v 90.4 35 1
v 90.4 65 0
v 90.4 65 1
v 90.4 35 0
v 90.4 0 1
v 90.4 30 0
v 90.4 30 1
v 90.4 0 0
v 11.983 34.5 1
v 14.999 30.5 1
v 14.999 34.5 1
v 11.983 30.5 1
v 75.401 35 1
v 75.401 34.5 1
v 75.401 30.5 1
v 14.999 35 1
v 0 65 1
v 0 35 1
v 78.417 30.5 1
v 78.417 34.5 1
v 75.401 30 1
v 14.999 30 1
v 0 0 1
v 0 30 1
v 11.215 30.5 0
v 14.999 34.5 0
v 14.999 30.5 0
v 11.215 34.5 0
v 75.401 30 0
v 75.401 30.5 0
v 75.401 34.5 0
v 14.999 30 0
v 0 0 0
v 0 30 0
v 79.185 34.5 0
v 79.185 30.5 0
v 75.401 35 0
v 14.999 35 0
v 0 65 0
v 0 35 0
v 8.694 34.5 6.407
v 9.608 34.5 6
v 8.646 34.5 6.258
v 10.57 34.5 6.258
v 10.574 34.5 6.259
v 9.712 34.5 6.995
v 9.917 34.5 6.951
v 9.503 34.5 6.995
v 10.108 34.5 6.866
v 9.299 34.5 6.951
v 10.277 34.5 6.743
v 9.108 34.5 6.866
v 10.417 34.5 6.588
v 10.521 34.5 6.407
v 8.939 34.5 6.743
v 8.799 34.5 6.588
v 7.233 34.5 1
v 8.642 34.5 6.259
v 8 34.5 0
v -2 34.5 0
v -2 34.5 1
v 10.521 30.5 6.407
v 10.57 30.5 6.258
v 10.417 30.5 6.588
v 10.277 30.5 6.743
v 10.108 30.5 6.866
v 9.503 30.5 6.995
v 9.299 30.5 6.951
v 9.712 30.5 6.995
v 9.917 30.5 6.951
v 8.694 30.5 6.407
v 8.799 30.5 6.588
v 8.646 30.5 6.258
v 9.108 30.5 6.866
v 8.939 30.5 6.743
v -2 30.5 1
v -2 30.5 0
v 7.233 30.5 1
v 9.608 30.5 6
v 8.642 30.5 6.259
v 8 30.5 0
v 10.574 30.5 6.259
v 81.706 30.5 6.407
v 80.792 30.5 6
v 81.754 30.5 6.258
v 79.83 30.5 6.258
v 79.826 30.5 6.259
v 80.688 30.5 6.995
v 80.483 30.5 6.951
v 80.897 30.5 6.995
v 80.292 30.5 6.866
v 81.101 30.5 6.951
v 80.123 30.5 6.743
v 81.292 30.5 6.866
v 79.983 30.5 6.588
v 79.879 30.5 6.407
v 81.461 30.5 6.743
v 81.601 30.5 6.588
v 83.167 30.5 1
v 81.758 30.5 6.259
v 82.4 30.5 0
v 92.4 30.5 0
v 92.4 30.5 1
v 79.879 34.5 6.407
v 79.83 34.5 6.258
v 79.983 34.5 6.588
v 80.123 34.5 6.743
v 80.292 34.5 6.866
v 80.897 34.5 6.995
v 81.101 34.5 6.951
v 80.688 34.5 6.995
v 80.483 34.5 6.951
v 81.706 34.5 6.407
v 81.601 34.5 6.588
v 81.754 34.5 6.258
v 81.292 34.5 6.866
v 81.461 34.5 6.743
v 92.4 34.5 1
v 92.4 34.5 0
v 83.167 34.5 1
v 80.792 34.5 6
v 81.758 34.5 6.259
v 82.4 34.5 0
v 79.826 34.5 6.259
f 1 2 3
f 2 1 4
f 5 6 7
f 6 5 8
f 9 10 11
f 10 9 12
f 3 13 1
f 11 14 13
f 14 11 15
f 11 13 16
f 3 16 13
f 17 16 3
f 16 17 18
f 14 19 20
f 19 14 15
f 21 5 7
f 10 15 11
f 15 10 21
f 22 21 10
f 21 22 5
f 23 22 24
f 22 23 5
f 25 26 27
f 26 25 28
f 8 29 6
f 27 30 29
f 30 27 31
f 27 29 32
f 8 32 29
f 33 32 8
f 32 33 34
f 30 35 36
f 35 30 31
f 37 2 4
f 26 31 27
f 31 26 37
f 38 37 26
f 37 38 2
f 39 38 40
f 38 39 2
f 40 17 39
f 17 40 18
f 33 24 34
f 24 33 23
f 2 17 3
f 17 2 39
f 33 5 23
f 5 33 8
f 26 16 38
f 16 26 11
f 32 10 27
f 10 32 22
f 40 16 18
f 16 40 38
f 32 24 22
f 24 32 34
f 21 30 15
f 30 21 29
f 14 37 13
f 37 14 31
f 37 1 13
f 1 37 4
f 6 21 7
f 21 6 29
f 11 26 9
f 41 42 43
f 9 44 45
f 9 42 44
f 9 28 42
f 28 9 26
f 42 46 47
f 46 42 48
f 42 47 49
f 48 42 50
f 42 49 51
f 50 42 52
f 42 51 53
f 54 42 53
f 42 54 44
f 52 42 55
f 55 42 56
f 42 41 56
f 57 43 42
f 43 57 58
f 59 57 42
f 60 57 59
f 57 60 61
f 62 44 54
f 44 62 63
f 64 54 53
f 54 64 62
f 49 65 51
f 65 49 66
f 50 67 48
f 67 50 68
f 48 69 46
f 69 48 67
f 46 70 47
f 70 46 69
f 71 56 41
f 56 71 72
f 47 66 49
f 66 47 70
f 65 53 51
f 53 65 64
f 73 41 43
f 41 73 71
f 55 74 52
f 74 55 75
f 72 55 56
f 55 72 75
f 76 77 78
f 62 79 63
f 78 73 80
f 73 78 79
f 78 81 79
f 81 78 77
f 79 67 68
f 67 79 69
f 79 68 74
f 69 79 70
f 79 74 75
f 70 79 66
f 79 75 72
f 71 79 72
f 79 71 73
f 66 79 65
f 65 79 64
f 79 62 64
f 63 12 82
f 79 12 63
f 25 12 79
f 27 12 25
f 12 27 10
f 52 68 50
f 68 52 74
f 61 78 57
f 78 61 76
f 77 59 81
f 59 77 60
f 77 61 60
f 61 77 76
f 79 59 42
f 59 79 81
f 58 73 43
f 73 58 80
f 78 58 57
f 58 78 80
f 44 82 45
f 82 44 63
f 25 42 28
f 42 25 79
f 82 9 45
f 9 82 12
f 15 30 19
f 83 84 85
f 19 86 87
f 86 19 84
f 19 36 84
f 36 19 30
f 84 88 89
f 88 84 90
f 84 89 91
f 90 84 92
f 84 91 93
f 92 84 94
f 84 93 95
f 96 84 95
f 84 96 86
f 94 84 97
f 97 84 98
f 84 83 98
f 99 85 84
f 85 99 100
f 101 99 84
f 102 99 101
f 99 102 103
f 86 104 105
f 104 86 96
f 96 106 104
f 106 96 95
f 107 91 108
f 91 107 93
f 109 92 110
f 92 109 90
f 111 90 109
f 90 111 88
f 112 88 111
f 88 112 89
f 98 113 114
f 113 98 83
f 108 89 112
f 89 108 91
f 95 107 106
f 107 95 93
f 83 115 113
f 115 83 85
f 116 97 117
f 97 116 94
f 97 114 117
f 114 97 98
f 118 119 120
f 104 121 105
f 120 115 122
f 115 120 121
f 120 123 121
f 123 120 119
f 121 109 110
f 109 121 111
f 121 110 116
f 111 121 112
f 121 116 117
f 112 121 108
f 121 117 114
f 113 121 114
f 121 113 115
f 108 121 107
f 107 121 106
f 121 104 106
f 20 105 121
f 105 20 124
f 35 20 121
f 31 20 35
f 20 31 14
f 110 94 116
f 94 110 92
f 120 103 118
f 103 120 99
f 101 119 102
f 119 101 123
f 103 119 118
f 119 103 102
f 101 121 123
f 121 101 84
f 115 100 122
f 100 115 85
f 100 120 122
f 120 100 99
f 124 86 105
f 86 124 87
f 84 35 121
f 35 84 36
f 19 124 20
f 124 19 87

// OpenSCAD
// Mike's Experiment for Elevation 3D Print


// E.g. 4x6, 5x7, etc.
// 6x4 = [154, 103]
// 3.5x2.5 = [88.9, 63.5]
nominal_dimensions = [88.9, 63.5];

// Object to print
// "frame", "back"
object_type = "back";


// Output thickness (not including text) (mm)
thickness = 10;
// Depth of the frame in front of the photo. Large value here makes a shadow box.
front_depth = 2;

// Width of a single edge of the frame.
frame_width = 10;

// Where the front of the frame overlaps the photo
inner_photo_margin = 2;

// Tolerance around the outside of the photo on the back of the frame
outer_photo_margin = 1;

// The back plate that holds the photo.
back_thickness = 1;

// END Params.
// Everything below here is generation code.


// Photo positioning
outer_photo_dimensions = [nominal_dimensions.x + outer_photo_margin * 2, nominal_dimensions.y + outer_photo_margin * 2];
inner_photo_dimensions = [nominal_dimensions.x - inner_photo_margin * 2, nominal_dimensions.y - inner_photo_margin * 2];

photo_position = [frame_width, frame_width];



// Combine all the parts
if (object_type == "frame") {
  difference() {
    cube([inner_photo_dimensions.x + 2*frame_width, inner_photo_dimensions.y + 2*frame_width, thickness]);

    translate([photo_position.x, photo_position.y, -0.001]) cube([inner_photo_dimensions.x, inner_photo_dimensions.y, thickness + 0.002]);
    translate([photo_position.x - inner_photo_margin, photo_position.y - inner_photo_margin, -front_depth]) cube([outer_photo_dimensions.x, outer_photo_dimensions.y, thickness]);
    
    // Clip slots
    translate([photo_position.x - inner_photo_margin - 2, photo_position.y + (inner_photo_dimensions.y - 5)/2, thickness - front_depth - 2]) cube([20, 5, 2]);
    translate([photo_position.x + inner_photo_dimensions.x + inner_photo_margin - 20 + 2, photo_position.y + (inner_photo_dimensions.y - 5)/2, thickness - front_depth - 2]) cube([20, 5, 2]);
  }
}


module clip() {
  l1 = 10;
  w = 4;
  h = 6;
  a = 15;
  l_tab = h / cos(a);
  
  cube([l1, w, back_thickness]);
  
  translate([l1, 0, 0]) rotate([0, a, 0]) translate([-back_thickness, 0, 0]) cube([back_thickness, w, l_tab]);
  translate([l1+2*h*tan(a), 0, 0]) rotate([0, -a, 0]) cube([back_thickness, w, l_tab]);
  
  translate([l1+2*h*tan(a), 0, 0]) cube([4, w, back_thickness]);
  
  translate([l1+h*tan(a), 0, h]) difference() {
    rotate([-90, 0, 0]) cylinder(h=w, r=back_thickness, $fn=30);
    translate([0, 0, -10]) cube(20, center=true);
  }
}

if (object_type == "back") {
  len_x = outer_photo_dimensions.x - 0.5;
  len_y = outer_photo_dimensions.y - 0.5;
  
  difference() {
    cube([len_x, len_y, back_thickness]);
    
    translate([-0.001, (len_y - 5)/2, -1]) cube([15, 4+1, back_thickness+2]);
    translate([len_x+0.001 - 15, (len_y - 5)/2, -1]) cube([15, 4+1, back_thickness+2]);
  }
  
  translate([-2, (len_y - 4)/2, 0]) clip();
  translate([len_x + 2, 4 + (len_y - 4)/2, 0]) rotate([0, 0, 180]) clip();
}
